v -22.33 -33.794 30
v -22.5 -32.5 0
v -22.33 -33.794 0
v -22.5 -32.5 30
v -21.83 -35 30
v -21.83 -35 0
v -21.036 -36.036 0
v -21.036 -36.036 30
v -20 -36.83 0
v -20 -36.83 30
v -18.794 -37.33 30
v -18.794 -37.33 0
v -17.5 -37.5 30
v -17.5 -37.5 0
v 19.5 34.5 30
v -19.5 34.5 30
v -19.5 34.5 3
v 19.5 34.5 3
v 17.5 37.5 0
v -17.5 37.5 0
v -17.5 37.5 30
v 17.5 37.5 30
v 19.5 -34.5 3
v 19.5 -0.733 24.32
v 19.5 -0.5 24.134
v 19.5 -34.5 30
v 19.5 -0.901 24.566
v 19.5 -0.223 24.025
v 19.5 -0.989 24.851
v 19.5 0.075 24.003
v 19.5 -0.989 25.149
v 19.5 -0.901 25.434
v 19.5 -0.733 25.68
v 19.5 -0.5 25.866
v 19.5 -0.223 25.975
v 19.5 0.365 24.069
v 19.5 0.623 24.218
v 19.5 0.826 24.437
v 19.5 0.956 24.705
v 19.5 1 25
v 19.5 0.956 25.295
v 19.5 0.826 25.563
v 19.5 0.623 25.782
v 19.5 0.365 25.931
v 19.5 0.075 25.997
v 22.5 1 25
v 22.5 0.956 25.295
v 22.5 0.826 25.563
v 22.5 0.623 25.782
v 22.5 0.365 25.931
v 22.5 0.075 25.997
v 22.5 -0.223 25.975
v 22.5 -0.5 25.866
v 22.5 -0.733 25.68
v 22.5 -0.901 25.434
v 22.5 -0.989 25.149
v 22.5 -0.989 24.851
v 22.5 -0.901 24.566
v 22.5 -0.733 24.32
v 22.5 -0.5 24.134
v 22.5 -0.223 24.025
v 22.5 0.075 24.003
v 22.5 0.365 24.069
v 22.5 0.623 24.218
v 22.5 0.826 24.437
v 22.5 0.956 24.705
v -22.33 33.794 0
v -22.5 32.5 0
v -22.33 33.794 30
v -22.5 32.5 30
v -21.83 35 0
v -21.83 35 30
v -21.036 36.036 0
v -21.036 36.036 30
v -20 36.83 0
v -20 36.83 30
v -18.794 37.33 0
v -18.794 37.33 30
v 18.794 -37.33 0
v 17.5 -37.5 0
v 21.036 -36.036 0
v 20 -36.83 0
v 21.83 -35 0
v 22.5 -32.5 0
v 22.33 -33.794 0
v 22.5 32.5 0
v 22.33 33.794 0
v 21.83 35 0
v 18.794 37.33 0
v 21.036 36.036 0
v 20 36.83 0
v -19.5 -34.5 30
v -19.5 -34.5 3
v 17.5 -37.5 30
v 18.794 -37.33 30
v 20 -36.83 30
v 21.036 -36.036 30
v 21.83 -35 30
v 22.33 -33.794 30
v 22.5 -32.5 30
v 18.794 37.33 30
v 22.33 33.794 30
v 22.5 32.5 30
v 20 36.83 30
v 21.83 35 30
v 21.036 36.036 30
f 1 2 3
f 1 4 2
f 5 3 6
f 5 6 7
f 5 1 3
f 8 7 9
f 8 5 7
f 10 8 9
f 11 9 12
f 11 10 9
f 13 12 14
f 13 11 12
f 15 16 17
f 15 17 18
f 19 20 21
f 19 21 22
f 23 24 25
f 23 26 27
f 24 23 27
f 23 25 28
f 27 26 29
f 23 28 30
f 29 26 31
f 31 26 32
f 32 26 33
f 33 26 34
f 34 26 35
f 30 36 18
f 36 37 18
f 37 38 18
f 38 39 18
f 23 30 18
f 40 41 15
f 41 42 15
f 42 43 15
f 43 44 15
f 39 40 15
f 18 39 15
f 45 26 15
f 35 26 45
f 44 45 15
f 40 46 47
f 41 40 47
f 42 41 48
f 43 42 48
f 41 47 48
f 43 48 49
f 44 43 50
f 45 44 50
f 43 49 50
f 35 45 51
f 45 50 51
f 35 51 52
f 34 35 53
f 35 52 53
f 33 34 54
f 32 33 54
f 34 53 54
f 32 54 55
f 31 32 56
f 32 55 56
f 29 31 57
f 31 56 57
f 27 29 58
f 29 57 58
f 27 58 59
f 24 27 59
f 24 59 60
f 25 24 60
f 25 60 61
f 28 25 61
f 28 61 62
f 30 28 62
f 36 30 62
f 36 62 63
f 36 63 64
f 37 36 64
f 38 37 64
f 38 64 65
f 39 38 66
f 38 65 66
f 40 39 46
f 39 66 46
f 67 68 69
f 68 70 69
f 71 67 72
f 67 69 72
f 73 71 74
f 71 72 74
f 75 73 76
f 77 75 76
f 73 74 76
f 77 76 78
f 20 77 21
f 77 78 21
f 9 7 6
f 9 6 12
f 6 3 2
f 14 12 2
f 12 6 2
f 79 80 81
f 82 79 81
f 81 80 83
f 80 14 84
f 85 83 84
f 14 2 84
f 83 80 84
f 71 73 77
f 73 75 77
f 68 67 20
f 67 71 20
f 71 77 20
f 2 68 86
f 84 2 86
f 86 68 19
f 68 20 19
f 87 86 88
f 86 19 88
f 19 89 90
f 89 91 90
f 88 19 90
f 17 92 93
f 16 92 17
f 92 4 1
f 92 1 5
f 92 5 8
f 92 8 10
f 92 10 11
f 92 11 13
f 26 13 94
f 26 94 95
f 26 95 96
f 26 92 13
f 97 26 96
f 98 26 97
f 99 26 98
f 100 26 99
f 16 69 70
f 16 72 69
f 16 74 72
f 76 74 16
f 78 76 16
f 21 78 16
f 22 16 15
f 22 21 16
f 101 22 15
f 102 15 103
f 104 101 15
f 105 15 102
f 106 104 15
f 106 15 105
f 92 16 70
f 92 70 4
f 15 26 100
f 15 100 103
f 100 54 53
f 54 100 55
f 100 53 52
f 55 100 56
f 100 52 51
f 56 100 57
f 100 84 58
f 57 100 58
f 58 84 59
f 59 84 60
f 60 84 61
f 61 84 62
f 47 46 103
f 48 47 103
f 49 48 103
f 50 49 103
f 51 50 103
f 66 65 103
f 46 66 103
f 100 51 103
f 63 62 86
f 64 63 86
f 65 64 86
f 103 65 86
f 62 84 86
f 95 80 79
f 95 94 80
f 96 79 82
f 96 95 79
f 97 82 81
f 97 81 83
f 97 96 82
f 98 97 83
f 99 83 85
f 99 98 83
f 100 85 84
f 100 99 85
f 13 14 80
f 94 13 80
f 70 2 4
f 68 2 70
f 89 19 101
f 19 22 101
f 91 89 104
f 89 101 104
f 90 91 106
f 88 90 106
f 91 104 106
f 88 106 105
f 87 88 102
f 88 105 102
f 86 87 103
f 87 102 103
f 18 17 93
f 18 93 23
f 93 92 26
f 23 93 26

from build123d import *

# Parameters (mm, degrees)
F0_W     = 45
F0_H     = 75
F1_DEPTH = 30
F2_W     = 39
F2_H     = 69
F3_DEPTH = 27
F4_R     = 5
F5_R     = 1
F6_DEPTH = 3


with BuildPart() as f1:
    # F0 (on Top) → F1 (new body)
    with BuildSketch(Plane.XY):
        Rectangle(F0_W, F0_H)
    extrude(amount=F1_DEPTH)

    # F2 (on face) → F3 (cut)
    with BuildSketch(Plane.XY.offset(30)):
        Rectangle(F2_W, F2_H)
    extrude(amount=-F3_DEPTH, mode=Mode.SUBTRACT)

    # F4
    f4_edges = [f1.edges().sort_by_distance(p)[0] for p in [
        (22.5, -37.5, 15),
        (-22.5, -37.5, 15),
        (22.5, 37.5, 15),
        (-22.5, 37.5, 15),
    ]]
    fillet(f4_edges, radius=F4_R)

    # F5 (on face) → F6 (cut)
    with BuildSketch(Plane.YZ.offset(22.5)):
        with Locations((0, 25)):
            Circle(F5_R)
    extrude(amount=-F6_DEPTH, mode=Mode.SUBTRACT)


solid = f1.part
